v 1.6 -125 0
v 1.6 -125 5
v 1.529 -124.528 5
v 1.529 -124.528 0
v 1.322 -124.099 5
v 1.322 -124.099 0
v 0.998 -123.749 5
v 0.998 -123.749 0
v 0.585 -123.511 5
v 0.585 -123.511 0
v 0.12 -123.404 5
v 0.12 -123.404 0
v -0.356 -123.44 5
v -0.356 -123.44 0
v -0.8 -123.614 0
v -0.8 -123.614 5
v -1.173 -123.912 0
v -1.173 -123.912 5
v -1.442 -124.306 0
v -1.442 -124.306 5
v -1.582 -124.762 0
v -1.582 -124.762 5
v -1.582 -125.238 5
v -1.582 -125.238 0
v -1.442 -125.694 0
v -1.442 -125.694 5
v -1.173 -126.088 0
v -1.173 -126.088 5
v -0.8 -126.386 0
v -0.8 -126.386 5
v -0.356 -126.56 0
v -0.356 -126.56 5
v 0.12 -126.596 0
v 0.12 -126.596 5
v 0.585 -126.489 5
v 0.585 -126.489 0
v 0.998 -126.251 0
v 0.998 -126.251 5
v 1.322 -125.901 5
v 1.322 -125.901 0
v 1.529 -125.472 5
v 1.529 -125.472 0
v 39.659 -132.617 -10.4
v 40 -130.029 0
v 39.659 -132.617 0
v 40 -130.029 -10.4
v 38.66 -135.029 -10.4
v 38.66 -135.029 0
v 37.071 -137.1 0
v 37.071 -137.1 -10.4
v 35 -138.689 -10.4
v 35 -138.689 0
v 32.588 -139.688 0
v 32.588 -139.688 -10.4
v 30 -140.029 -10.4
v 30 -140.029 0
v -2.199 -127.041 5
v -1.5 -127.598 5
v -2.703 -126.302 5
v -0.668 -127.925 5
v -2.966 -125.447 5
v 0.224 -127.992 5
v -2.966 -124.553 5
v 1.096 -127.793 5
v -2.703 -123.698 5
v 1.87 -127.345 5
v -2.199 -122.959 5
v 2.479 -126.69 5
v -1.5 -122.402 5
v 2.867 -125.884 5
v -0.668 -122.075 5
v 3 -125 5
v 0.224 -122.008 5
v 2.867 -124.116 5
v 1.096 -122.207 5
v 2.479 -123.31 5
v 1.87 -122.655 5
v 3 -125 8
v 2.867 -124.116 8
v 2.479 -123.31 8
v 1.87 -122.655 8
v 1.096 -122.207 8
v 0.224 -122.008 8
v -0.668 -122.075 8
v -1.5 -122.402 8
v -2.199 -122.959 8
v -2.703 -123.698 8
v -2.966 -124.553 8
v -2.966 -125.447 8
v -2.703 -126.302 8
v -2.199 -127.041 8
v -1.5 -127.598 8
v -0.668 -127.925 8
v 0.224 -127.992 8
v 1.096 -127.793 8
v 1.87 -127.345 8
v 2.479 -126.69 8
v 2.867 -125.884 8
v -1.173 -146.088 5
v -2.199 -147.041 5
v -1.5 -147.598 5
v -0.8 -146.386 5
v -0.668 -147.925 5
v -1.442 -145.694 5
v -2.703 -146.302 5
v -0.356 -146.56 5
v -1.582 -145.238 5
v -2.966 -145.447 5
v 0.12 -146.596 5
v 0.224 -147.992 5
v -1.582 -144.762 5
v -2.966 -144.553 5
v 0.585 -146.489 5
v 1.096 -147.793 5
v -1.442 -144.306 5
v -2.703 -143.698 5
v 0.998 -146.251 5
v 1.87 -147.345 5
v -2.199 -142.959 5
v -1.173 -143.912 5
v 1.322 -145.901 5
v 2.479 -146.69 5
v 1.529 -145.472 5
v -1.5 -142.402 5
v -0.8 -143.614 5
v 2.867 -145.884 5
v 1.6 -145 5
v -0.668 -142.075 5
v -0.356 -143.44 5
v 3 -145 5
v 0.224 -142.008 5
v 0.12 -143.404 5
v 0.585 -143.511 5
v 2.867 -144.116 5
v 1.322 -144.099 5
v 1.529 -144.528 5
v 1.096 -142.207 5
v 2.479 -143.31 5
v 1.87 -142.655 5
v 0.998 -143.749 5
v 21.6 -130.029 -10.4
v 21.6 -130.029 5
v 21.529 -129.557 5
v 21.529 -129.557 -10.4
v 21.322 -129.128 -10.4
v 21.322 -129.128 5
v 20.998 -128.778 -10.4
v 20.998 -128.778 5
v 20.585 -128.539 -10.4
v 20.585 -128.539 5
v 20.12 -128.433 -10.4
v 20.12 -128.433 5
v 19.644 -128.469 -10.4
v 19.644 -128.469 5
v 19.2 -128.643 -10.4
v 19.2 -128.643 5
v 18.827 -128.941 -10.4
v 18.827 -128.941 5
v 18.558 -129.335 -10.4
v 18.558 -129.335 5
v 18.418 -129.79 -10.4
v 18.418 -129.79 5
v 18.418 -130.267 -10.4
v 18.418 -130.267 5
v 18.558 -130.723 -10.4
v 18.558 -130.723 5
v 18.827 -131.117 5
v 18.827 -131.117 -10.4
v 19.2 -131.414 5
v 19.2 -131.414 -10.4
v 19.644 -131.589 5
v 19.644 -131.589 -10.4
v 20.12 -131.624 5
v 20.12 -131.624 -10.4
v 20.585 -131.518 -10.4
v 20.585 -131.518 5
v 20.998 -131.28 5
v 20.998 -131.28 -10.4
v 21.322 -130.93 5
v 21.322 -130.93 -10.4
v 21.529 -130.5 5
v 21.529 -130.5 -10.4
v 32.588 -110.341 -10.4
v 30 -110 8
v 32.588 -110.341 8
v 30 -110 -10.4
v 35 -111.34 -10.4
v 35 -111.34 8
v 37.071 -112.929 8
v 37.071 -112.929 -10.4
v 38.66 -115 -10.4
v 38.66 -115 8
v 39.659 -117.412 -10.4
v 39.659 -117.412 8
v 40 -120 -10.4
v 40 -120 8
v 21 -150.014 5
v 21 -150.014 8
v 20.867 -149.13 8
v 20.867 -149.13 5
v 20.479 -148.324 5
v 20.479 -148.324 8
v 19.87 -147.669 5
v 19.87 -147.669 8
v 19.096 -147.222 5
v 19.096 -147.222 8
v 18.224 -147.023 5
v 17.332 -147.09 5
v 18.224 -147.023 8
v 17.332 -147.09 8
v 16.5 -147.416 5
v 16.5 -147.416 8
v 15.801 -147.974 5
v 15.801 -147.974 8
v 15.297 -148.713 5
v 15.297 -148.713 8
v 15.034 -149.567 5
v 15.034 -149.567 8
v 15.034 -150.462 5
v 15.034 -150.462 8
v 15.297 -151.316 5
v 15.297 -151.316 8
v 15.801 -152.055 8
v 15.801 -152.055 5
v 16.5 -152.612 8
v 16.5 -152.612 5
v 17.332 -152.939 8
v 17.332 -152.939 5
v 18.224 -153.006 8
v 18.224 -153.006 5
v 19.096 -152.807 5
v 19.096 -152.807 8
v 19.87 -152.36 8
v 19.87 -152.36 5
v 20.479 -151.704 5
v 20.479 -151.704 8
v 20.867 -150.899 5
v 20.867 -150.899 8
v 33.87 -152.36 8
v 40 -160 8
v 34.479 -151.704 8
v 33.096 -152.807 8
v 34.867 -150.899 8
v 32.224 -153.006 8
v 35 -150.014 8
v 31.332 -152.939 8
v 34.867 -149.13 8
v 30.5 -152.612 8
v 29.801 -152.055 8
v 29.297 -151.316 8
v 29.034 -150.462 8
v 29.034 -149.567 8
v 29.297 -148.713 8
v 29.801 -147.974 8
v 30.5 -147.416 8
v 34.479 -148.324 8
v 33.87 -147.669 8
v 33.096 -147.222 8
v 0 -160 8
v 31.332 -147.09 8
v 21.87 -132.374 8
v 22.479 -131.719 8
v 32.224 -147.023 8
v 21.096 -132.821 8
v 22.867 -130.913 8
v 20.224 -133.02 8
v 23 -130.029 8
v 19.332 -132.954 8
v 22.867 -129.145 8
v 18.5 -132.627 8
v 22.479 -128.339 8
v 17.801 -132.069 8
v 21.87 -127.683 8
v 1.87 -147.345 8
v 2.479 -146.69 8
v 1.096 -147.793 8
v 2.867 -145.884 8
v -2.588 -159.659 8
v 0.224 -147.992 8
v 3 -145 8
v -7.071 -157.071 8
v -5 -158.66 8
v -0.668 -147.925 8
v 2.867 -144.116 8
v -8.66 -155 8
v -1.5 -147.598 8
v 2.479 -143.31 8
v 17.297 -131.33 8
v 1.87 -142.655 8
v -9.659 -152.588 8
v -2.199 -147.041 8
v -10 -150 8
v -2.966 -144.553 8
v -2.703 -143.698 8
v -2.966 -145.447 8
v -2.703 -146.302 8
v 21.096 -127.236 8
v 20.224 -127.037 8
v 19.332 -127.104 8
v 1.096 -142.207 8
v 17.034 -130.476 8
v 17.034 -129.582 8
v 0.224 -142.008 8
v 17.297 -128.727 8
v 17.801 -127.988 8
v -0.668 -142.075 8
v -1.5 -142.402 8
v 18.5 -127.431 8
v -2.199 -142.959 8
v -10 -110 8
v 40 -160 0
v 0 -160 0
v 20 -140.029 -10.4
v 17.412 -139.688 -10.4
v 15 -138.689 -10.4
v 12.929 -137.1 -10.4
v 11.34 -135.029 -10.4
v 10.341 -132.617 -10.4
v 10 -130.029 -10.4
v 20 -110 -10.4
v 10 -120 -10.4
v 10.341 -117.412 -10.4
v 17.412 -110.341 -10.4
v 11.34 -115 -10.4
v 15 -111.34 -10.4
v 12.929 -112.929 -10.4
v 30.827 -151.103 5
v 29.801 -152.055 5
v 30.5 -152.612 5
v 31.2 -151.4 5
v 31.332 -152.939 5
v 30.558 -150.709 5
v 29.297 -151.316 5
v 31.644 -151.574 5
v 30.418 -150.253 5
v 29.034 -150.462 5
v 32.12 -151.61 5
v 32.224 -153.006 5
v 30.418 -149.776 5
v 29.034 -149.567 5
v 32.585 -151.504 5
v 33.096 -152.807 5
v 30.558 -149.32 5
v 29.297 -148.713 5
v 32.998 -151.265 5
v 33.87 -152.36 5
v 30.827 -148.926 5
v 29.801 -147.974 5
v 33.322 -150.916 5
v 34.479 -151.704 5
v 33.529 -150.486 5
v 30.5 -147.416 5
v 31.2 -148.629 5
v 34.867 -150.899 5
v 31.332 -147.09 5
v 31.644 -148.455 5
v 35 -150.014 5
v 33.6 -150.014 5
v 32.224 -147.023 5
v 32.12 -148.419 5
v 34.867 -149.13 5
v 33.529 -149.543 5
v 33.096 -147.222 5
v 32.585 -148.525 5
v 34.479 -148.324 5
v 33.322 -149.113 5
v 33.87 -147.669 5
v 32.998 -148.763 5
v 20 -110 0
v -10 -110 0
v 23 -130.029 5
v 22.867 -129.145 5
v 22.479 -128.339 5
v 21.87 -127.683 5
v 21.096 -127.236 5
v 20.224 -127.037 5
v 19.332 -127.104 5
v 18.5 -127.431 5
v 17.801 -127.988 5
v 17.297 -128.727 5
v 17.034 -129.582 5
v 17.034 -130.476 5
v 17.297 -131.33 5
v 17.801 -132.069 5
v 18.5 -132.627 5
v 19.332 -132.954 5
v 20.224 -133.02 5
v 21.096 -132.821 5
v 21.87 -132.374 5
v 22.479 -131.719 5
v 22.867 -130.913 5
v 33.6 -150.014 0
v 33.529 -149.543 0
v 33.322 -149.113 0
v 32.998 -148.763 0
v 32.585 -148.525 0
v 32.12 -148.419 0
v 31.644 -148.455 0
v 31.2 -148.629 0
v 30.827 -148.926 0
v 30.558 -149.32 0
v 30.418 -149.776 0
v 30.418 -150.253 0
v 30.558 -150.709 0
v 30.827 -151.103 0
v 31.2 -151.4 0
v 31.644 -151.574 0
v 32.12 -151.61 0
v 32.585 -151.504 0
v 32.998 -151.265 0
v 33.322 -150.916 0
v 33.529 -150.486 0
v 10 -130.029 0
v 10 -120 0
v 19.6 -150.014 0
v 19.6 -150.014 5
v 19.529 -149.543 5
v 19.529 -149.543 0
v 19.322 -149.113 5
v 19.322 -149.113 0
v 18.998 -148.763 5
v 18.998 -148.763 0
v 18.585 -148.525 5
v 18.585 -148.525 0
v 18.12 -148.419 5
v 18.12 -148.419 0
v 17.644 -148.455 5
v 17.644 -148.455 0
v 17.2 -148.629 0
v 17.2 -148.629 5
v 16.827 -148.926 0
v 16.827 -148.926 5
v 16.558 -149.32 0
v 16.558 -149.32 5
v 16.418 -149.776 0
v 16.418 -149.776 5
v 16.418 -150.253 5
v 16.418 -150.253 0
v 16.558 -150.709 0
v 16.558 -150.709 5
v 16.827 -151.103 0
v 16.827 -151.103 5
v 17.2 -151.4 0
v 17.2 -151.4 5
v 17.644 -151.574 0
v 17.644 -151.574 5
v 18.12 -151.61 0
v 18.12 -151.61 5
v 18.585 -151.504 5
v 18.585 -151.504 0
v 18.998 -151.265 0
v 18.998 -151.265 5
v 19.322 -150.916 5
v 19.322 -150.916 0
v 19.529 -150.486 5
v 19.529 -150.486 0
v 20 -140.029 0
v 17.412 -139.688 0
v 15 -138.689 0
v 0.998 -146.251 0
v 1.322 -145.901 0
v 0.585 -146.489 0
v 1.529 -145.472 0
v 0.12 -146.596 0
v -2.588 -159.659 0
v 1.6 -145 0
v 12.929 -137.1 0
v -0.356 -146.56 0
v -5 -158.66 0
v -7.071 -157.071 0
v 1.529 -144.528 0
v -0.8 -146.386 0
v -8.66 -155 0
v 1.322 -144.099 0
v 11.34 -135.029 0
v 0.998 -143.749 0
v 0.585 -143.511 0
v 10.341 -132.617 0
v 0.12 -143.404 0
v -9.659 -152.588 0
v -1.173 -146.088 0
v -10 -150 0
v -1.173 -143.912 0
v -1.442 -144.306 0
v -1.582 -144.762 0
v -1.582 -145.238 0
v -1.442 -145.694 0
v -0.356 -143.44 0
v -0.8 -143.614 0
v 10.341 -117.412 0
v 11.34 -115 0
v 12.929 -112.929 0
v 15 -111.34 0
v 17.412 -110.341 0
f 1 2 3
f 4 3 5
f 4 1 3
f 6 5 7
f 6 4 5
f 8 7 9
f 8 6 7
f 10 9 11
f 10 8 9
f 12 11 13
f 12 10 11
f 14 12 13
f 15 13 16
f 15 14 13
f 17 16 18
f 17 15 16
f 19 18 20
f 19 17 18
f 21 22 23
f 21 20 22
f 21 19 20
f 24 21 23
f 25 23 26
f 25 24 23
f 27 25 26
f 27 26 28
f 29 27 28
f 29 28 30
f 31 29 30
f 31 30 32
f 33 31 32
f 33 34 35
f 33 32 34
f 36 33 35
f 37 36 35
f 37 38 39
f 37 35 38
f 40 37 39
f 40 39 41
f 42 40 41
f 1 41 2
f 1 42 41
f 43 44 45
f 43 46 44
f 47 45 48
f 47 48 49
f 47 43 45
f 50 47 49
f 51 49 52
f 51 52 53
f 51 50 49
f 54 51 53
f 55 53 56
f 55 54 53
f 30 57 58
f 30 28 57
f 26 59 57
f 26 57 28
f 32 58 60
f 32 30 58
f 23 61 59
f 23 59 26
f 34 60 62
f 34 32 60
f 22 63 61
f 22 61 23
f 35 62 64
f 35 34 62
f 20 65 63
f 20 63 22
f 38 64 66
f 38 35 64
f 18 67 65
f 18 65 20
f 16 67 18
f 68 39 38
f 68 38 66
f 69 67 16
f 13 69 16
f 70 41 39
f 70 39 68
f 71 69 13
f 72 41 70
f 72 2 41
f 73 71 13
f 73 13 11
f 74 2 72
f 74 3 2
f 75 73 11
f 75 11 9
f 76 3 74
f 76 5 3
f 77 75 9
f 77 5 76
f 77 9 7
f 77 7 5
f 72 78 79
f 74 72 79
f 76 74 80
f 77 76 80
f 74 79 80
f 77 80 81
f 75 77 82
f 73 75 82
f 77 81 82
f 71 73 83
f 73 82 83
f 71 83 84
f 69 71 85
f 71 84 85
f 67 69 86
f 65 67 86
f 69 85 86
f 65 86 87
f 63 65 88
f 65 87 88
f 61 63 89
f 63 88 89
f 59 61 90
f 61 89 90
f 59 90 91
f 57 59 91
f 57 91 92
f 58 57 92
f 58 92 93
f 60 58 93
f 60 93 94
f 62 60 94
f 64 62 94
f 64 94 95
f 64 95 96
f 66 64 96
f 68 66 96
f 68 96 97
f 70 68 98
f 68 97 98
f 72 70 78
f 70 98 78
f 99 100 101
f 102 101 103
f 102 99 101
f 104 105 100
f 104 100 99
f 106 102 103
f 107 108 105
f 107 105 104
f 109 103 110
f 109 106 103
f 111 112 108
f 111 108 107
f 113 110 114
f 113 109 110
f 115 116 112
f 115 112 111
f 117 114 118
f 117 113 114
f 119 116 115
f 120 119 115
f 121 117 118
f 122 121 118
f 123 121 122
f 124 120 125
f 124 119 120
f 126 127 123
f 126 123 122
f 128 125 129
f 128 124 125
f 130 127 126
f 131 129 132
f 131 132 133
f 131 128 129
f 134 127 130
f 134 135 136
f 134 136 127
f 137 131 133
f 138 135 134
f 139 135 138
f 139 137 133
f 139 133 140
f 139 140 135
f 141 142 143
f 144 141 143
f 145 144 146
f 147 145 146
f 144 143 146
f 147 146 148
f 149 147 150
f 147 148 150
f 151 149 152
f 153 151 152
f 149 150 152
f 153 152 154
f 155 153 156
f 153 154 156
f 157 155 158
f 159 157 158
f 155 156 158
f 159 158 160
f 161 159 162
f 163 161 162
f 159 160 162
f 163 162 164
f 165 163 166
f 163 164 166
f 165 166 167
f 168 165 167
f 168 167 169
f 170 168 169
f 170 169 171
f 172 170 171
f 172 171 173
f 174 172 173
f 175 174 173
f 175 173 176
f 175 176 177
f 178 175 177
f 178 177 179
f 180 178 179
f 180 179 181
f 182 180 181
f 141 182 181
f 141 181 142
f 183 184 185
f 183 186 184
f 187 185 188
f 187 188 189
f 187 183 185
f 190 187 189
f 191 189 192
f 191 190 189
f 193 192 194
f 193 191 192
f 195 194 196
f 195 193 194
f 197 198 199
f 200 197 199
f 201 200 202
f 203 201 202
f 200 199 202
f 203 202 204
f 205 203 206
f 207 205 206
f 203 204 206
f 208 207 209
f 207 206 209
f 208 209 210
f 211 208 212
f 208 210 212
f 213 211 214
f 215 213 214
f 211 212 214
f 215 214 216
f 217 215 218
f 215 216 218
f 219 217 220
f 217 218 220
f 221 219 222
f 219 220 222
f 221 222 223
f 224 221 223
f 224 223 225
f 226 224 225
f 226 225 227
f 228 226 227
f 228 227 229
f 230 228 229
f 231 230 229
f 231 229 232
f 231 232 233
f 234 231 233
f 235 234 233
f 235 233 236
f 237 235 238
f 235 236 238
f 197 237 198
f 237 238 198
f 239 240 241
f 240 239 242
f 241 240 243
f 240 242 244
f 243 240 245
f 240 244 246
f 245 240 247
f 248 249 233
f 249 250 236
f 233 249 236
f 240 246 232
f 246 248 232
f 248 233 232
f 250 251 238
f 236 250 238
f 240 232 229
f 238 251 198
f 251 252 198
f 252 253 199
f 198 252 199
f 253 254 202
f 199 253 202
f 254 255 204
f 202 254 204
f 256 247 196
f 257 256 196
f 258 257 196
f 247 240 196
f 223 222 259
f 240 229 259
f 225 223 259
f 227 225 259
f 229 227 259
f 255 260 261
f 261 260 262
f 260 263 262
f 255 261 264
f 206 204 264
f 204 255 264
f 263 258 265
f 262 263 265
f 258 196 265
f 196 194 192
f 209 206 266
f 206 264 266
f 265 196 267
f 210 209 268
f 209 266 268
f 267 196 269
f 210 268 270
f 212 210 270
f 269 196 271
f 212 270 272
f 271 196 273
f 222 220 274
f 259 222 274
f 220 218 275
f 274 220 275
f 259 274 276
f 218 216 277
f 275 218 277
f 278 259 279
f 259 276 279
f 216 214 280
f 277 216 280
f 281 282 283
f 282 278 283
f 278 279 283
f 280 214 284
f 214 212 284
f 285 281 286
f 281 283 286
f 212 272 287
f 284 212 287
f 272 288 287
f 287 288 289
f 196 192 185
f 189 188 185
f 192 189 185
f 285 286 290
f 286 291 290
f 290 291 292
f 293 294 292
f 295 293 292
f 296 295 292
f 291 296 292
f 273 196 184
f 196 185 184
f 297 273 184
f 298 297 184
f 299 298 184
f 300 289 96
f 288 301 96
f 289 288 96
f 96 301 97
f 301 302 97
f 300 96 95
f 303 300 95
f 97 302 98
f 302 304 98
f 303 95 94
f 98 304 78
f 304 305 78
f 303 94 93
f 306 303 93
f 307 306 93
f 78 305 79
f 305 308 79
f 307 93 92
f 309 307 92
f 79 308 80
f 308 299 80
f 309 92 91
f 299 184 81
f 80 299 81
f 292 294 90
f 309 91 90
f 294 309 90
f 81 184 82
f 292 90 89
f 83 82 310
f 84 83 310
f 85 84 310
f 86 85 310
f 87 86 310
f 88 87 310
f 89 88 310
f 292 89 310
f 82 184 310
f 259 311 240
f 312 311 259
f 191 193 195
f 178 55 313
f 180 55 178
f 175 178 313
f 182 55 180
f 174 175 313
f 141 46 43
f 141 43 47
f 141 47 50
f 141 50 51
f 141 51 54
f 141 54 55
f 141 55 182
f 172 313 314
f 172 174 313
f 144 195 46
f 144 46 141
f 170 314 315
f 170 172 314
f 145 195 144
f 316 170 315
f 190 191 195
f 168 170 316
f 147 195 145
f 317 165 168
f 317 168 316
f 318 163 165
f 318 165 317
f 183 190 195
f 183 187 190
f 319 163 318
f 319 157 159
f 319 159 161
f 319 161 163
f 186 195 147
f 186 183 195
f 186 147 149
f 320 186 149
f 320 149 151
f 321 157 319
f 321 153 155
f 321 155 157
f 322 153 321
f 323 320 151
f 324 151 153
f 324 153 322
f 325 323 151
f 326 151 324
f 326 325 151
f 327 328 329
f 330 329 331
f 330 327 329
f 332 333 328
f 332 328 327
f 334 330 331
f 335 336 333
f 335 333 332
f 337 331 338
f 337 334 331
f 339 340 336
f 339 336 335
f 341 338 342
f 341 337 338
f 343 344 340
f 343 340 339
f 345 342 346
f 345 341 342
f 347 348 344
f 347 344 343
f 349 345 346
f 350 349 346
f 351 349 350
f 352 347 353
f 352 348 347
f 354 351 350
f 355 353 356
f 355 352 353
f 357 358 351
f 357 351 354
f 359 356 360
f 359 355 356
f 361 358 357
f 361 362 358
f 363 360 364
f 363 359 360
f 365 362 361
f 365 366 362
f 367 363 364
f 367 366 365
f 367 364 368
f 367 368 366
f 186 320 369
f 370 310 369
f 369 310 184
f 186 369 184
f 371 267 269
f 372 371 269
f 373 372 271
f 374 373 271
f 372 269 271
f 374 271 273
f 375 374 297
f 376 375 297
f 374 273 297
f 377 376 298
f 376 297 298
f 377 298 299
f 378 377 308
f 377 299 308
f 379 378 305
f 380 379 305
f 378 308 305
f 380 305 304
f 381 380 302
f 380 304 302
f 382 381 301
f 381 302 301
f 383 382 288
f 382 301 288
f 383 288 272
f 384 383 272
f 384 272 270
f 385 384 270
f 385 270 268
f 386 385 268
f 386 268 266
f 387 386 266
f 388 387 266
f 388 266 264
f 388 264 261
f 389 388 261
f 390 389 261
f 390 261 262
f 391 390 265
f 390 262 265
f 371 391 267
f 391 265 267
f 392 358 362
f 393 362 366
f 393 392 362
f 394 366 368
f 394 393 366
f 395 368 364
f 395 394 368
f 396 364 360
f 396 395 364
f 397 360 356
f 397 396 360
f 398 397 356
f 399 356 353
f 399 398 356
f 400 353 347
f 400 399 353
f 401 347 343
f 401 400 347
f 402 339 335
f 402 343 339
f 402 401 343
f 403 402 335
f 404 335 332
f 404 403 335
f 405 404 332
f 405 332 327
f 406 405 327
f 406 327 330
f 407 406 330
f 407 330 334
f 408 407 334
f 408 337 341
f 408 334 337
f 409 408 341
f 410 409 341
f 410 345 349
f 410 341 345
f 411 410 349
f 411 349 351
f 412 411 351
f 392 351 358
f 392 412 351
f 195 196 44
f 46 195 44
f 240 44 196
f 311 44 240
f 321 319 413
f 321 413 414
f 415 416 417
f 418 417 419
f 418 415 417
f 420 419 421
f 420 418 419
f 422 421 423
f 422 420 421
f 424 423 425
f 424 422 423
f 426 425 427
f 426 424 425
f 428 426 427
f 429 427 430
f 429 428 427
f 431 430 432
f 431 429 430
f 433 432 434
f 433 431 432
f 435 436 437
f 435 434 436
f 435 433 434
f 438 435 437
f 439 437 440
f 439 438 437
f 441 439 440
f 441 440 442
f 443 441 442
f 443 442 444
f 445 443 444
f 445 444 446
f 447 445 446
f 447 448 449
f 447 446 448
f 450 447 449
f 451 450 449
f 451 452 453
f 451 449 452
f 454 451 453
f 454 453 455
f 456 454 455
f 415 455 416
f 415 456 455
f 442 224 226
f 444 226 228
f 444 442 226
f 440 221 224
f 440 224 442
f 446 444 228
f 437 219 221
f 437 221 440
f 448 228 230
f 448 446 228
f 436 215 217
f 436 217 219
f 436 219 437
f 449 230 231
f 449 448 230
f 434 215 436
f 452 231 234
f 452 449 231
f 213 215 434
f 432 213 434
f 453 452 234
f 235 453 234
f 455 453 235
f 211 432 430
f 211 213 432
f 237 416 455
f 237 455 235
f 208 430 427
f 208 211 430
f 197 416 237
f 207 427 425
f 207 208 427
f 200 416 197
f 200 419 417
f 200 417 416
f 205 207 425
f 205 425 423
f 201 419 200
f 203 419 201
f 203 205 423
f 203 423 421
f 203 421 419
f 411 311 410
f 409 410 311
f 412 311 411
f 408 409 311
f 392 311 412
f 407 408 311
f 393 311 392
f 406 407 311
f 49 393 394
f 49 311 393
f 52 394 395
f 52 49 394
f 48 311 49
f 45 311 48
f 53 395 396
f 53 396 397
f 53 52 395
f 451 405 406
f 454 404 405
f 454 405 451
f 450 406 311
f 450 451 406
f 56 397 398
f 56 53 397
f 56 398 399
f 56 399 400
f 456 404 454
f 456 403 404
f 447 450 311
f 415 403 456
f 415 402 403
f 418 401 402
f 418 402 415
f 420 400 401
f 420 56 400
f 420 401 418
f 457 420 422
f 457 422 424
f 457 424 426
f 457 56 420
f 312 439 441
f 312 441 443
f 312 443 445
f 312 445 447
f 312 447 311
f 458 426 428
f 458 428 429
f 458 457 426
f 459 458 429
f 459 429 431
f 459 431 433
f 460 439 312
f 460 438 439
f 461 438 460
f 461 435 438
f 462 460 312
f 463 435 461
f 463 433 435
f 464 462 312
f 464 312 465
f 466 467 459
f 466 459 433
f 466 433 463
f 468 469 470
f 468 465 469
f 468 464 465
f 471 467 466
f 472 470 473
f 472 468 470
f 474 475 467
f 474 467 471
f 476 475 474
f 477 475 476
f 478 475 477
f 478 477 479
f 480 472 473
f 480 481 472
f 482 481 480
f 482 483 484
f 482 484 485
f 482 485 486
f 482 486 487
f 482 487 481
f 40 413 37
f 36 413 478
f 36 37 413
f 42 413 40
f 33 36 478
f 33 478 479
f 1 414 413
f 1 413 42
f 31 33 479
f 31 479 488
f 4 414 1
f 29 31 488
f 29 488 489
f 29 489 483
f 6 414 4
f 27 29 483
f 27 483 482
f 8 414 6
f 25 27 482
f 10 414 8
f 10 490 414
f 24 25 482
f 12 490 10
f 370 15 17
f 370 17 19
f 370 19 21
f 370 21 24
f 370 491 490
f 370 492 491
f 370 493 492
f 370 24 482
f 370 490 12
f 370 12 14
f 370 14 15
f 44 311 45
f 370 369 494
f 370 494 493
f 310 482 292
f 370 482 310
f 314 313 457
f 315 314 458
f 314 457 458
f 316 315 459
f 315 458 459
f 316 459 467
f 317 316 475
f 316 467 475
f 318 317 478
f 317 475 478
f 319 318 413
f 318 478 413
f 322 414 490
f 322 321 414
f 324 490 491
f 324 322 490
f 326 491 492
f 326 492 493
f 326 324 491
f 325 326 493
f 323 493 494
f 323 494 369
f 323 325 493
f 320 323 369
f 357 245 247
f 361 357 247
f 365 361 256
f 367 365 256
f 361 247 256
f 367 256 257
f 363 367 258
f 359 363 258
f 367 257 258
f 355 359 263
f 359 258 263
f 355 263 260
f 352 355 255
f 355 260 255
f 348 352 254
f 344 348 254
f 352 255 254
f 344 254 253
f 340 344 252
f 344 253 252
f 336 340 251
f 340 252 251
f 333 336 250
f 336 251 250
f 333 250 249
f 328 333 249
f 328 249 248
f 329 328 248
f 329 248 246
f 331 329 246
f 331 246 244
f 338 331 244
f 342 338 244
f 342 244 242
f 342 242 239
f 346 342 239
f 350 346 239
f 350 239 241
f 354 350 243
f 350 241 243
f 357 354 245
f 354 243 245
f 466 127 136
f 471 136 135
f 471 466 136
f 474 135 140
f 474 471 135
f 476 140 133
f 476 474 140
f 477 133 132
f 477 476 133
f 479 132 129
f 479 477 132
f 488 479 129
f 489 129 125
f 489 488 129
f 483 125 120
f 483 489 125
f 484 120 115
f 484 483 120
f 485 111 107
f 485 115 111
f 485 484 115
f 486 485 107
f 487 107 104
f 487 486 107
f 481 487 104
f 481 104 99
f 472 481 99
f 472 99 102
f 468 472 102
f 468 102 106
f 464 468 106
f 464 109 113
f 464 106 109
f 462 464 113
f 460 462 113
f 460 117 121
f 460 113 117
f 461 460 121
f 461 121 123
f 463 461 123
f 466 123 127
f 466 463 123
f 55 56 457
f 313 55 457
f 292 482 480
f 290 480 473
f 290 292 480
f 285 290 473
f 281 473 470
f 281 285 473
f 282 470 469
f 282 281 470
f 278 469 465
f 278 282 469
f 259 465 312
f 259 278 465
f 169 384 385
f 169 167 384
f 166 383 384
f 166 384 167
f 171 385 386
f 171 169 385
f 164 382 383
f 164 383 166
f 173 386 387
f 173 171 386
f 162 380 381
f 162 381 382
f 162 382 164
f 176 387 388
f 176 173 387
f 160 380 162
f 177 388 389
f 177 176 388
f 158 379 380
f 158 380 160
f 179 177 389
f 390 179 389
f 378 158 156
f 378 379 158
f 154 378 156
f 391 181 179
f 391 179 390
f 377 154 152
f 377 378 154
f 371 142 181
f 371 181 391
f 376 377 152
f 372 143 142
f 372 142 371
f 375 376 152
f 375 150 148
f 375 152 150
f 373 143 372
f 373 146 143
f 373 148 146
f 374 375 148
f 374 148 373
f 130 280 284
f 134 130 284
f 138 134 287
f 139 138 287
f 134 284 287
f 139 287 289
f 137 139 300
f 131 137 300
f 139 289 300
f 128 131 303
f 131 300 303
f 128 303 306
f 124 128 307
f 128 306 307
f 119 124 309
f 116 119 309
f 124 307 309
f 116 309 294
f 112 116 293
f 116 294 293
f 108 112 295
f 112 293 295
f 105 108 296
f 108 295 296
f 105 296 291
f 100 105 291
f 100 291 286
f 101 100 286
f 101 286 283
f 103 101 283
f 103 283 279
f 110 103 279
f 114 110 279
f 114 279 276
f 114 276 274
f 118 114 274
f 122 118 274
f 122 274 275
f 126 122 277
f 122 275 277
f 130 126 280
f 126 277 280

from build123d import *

# Parameters (mm, degrees)
SKETCH_1_R          = 1.6
EXTRUDE_1_DEPTH     = 8
SKETCH_2_R          = 3
CUT_EXTRUDE_1_DEPTH = 3
FILLET_1_R          = 10
SKETCH_3_R          = 1.6
EXTRUDE_2_DEPTH     = 18.3999492
SKETCH_4_R          = 3
CUT_EXTRUDE_2_DEPTH = 3
FILLET_2_R          = 10


with BuildPart() as part:
    # 草图1 → 凸台-拉伸1 (new body)
    with BuildSketch(Plane.XY):
        Polygon((-10, -110), (10, -110), (10, -140.028839027), (40, -140.028839027), (40, -160), (-10, -160), align=None)
        with Locations((0, -125)):
            Circle(SKETCH_1_R, mode=Mode.SUBTRACT)
        with Locations((0, -145)):
            Circle(SKETCH_1_R, mode=Mode.SUBTRACT)
        with Locations((18, -150.014419513)):
            Circle(SKETCH_1_R, mode=Mode.SUBTRACT)
        with Locations((32, -150.014419513)):
            Circle(SKETCH_1_R, mode=Mode.SUBTRACT)
    extrude(amount=EXTRUDE_1_DEPTH)

    # 草图2 → 切除-拉伸1 (cut)
    with BuildSketch(Plane.XY.offset(8)):
        with Locations((32, -150.014419513)):
            Circle(SKETCH_2_R)
        with Locations((18, -150.014419513)):
            Circle(SKETCH_2_R)
        with Locations((0, -145)):
            Circle(SKETCH_2_R)
        with Locations((0, -125)):
            Circle(SKETCH_2_R)
    extrude(amount=-CUT_EXTRUDE_1_DEPTH, mode=Mode.SUBTRACT)

    # 圆角1
    fillet_1_edges = [part.edges().sort_by_distance(p)[0] for p in [
        (10, -140.028839027, 4),
        (-10, -160, 4),
    ]]
    fillet(fillet_1_edges, radius=FILLET_1_R)

    # 草图3 → 凸台-拉伸2 (add)
    with BuildSketch(Plane.XY.offset(8)):
        with BuildLine():
            Line((10, -130.028839027), (10, -110))
            Line((10, -110), (40, -110))
            Line((40, -110), (40, -140.028839027))
            Line((40, -140.028839027), (20, -140.028839027))
            ThreePointArc((20, -140.028839027), (12.928932188, -137.099906839), (10, -130.028839027))
        make_face()
        with Locations((20, -130.028839027)):
            Circle(SKETCH_3_R, mode=Mode.SUBTRACT)
    extrude(amount=-EXTRUDE_2_DEPTH)

    # 草图4 → 切除-拉伸2 (cut)
    with BuildSketch(Plane.XY.offset(8)):
        with Locations((20, -130.028839027)):
            Circle(SKETCH_4_R)
    extrude(amount=-CUT_EXTRUDE_2_DEPTH, mode=Mode.SUBTRACT)

    # 圆角2
    fillet_2_edges = [part.edges().sort_by_distance(p)[0] for p in [
        (40, -140.028839027, -5.1999746),
        (40, -110, -1.1999746),
        (10, -110, -5.1999746),
    ]]
    fillet(fillet_2_edges, radius=FILLET_2_R)


solid = part.part
